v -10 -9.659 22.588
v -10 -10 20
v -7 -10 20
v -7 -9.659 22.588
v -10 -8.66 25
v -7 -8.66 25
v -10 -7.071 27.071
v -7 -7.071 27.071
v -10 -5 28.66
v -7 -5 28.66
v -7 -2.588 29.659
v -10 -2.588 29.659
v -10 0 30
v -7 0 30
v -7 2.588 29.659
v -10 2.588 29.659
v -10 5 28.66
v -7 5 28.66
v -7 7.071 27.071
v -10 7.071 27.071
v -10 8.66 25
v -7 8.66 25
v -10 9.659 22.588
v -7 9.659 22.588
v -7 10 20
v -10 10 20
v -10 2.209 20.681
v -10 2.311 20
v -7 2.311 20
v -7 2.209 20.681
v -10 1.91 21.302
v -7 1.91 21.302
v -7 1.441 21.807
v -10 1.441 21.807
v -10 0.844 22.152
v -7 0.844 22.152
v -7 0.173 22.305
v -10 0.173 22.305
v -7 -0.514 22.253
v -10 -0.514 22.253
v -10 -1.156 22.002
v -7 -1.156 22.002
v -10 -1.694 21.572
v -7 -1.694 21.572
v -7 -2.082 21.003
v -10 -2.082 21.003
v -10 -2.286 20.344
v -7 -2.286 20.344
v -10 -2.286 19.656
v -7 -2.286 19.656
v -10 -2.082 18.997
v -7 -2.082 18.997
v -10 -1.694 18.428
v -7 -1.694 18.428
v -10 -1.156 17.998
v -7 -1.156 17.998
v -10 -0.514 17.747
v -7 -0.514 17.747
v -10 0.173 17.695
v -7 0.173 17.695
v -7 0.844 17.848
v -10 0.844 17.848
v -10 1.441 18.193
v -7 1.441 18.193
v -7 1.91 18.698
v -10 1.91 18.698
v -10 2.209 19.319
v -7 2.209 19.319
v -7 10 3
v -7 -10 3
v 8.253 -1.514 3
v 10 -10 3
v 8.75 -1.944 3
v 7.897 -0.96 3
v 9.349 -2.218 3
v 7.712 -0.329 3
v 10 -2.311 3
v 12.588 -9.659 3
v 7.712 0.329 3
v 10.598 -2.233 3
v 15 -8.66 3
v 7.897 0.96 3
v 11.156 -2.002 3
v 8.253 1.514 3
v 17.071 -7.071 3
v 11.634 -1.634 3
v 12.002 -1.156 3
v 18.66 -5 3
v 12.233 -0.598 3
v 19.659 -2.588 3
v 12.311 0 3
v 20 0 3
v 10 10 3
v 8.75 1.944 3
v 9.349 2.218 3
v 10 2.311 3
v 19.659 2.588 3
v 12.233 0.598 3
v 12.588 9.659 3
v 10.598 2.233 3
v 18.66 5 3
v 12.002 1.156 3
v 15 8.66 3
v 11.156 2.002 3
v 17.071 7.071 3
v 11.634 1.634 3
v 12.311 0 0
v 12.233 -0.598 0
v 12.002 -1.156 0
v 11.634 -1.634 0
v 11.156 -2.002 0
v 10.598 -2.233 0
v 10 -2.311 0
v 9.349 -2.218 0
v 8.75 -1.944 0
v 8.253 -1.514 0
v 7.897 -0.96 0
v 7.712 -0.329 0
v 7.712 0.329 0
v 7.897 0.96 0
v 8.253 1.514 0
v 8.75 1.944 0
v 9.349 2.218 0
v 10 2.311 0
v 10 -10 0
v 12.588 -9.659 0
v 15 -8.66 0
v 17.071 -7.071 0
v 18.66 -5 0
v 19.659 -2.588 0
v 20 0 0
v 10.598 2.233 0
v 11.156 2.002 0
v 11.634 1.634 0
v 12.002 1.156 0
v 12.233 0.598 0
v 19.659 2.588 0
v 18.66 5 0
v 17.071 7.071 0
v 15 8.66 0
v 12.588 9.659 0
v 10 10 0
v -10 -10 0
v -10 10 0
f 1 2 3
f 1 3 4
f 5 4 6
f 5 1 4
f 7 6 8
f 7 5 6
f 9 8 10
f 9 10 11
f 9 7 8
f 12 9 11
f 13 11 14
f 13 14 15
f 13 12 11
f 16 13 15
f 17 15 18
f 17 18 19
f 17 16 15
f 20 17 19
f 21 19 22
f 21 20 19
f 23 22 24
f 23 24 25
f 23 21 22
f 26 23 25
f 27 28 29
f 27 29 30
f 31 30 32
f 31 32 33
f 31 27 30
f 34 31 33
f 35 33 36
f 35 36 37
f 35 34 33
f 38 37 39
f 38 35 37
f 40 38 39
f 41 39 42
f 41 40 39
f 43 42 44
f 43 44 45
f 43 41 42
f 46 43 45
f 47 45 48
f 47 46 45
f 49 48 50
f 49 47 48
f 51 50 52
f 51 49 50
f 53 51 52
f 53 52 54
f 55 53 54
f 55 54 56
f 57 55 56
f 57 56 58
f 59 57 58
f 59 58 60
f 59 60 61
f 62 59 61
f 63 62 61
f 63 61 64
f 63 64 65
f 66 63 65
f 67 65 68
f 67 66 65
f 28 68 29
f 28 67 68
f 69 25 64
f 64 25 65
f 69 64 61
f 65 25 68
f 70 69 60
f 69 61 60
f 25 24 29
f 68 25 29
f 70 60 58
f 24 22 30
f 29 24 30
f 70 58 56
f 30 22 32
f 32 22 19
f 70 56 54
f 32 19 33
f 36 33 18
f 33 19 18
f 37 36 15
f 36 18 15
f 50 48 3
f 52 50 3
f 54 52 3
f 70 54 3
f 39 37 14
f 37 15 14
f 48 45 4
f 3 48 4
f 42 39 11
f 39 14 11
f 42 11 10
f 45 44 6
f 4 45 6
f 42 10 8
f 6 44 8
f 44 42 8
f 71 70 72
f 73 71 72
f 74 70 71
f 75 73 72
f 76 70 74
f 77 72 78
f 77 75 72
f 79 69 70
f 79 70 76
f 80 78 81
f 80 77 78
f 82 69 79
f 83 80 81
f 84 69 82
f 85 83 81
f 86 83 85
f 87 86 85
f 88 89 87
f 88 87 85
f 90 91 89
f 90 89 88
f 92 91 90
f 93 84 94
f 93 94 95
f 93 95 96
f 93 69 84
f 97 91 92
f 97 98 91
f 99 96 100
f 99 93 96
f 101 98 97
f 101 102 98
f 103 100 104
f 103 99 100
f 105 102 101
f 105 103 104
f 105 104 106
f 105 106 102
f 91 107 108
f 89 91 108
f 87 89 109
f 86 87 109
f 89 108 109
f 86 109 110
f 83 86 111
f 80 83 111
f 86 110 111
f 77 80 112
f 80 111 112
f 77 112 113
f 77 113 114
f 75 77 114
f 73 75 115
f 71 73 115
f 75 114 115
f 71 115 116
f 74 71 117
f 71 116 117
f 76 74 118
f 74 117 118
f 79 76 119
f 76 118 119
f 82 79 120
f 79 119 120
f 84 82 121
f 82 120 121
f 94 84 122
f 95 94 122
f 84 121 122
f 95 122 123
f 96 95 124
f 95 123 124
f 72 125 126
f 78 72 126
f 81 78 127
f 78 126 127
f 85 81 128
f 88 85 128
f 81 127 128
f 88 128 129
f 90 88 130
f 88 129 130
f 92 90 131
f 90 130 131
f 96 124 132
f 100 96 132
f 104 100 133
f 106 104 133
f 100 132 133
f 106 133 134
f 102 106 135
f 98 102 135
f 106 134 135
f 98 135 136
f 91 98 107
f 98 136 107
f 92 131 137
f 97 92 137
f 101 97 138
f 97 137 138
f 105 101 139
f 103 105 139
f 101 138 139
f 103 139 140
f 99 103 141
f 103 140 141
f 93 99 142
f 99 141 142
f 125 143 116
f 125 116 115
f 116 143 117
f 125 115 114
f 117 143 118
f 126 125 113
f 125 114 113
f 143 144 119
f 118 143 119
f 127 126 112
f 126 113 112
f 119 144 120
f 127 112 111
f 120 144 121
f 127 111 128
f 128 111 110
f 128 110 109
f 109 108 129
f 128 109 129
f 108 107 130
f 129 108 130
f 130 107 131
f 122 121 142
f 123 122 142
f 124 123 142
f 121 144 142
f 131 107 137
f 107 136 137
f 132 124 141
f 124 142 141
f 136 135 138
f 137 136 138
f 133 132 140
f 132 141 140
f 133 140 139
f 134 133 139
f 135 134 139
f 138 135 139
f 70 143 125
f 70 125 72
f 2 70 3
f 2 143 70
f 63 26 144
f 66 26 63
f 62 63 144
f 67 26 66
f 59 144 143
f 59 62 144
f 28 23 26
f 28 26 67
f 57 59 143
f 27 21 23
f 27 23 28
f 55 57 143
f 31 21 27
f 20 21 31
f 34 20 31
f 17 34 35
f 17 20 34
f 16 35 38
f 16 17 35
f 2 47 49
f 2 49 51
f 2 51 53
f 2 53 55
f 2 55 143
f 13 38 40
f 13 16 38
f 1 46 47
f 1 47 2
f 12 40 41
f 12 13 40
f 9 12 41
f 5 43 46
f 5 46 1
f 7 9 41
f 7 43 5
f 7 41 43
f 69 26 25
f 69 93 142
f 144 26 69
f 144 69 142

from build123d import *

# Parameters (mm, degrees)
F1_DEPTH = 3
F3_DEPTH = 3


with BuildPart() as f1:
    # F0 (on Top) → F1 (new body)
    with BuildSketch(Plane.XY):
        with BuildLine():
            ThreePointArc((10, 10), (0, 0), (10, -10))
            Line((10, -10), (10, -2.3114))
            ThreePointArc((10, -2.3114), (7.6886, 0), (10, 2.3114))
            Line((10, 2.3114), (10, 10))
        make_face()
        with BuildLine():
            Line((-10, -10), (10, -10))
            ThreePointArc((10, -10), (0, 0), (10, 10))
            Line((10, 10), (-10, 10))
            Line((-10, 10), (-10, -10))
        make_face()
        with BuildLine():
            Line((10, -2.3114), (10, -10))
            ThreePointArc((10, -10), (17.0710678119, -7.0710678119), (20, 0))
            ThreePointArc((20, 0), (17.0710678119, 7.0710678119), (10, 10))
            Line((10, 10), (10, 2.3114))
            ThreePointArc((10, 2.3114), (11.634406614, 1.634406614), (12.3114, 0))
            ThreePointArc((12.3114, 0), (11.634406614, -1.634406614), (10, -2.3114))
        make_face()
    extrude(amount=F1_DEPTH)

    # F2 (on face) → F3 (join)
    with BuildSketch(Plane(origin=(-10, 0, 0), x_dir=(0, -1, 0), z_dir=(-1, 0, 0))):
        with BuildLine():
            Line((-10, 20), (-10, 0))
            Line((-10, 0), (10, 0))
            Line((10, 0), (10, 20))
            ThreePointArc((10, 20), (0, 10), (-10, 20))
        make_face()
        with BuildLine():
            ThreePointArc((10, 20), (0, 30), (-10, 20))
            Line((-10, 20), (-2.3114, 20))
            ThreePointArc((-2.3114, 20), (0, 22.3114), (2.3114, 20))
            Line((2.3114, 20), (10, 20))
        make_face()
        with BuildLine():
            Line((-2.3114, 20), (-10, 20))
            ThreePointArc((-10, 20), (0, 10), (10, 20))
            Line((10, 20), (2.3114, 20))
            ThreePointArc((2.3114, 20), (0, 17.6886), (-2.3114, 20))
        make_face()
    extrude(amount=-F3_DEPTH)


solid = f1.part
